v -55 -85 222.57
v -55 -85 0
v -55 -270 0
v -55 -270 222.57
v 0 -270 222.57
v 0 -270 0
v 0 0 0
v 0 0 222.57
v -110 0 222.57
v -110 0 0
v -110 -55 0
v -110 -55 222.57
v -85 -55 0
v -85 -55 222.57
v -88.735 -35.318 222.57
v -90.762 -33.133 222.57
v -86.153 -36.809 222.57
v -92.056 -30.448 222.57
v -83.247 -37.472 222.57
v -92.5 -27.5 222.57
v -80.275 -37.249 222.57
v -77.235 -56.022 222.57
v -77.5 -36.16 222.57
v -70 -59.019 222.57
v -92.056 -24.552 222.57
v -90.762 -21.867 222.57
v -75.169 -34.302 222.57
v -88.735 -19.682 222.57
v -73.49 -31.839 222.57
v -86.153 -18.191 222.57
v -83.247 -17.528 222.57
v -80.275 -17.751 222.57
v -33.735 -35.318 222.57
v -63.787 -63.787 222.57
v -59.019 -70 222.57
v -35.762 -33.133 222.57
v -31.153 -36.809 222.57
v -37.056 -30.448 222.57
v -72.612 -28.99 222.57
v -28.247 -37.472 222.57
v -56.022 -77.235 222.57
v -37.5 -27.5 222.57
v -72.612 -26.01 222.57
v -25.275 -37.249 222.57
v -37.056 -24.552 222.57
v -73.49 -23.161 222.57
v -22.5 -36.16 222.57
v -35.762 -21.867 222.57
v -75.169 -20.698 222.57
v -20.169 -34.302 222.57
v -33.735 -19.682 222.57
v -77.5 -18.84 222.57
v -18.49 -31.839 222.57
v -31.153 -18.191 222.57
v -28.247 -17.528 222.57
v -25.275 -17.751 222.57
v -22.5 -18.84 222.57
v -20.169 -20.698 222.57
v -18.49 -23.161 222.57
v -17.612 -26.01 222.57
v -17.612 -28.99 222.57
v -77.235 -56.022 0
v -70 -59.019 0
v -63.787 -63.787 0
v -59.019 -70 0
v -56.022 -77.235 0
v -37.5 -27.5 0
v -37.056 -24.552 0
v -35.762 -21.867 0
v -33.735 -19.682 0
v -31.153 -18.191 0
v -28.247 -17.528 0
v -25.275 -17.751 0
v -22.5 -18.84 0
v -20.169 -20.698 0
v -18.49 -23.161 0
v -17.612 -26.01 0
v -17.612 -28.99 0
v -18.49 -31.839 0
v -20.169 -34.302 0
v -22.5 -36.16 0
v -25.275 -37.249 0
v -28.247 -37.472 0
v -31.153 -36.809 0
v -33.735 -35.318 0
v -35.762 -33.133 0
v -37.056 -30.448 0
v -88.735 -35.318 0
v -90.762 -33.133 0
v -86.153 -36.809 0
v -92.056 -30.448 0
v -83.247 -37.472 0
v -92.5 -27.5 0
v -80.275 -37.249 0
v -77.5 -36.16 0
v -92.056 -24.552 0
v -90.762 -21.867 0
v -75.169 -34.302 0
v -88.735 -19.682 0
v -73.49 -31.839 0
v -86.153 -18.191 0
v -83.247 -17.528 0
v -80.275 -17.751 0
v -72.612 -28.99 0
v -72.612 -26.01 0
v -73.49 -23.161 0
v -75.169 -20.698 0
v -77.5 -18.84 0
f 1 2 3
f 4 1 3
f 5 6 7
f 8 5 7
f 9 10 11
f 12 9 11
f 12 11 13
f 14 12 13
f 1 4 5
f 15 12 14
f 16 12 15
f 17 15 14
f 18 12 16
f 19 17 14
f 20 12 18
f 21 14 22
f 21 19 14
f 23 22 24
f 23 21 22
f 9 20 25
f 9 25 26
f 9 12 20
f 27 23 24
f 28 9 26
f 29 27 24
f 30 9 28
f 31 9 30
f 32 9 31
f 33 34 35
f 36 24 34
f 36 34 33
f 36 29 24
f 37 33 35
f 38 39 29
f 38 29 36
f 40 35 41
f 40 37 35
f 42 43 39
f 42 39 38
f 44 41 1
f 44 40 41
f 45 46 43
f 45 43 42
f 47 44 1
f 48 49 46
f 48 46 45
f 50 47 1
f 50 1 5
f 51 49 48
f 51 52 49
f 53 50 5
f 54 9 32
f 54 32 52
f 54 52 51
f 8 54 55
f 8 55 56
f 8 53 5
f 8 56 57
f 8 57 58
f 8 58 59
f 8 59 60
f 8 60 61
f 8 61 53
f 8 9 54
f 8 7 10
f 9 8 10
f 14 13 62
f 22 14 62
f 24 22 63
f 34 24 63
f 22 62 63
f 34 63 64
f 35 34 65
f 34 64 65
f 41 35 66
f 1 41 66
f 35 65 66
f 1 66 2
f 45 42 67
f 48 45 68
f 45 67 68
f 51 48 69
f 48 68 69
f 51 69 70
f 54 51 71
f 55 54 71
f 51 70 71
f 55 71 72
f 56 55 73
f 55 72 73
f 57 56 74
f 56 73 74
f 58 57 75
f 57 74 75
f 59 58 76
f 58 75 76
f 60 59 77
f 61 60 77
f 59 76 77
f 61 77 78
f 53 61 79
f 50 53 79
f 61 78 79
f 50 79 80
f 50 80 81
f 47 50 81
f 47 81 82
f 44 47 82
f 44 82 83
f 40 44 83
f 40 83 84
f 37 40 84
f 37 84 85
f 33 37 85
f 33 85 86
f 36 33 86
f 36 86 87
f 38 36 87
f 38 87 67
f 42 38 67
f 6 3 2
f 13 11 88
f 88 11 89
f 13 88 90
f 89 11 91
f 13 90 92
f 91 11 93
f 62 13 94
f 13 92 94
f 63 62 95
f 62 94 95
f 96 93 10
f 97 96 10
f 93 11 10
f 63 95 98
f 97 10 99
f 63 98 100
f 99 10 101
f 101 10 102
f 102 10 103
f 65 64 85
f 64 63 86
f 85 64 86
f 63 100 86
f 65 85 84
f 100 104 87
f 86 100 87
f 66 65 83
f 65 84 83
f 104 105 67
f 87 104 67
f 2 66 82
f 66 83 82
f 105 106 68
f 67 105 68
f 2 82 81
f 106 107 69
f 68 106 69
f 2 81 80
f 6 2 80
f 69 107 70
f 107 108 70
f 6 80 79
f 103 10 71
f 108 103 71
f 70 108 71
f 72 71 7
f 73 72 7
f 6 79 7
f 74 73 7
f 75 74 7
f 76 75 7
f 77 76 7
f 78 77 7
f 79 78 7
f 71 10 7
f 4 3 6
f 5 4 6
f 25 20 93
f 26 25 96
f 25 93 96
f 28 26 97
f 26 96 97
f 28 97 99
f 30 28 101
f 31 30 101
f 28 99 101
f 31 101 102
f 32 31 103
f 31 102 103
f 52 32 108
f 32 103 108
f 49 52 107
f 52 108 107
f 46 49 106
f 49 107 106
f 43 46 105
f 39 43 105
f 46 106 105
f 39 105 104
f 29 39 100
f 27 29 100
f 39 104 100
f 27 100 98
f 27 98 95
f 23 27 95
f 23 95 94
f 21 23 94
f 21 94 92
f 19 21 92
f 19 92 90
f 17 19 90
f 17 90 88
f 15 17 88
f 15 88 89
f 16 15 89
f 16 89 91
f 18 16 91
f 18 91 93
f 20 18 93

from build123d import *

# Parameters (mm, degrees)
BOSS_EXTRUDE1_DEPTH    = 222.57
F_20_0MM_DOWEL_HOLE1_D = 20


with BuildPart() as part:
    # Sketch1 → Boss-Extrude1 (new body)
    with BuildSketch(Plane.XY):
        with BuildLine():
            Line((0, 0), (-110, 0))
            Line((-110, 0), (-110, -55))
            Line((-110, -55), (-85, -55))
            ThreePointArc((-85, -55), (-63.786796564, -63.786796564), (-55, -85))
            Line((-55, -85), (-55, -270))
            Line((-55, -270), (0, -270))
            Line((0, -270), (0, 0))
        make_face()
    extrude(amount=BOSS_EXTRUDE1_DEPTH)

    # Ø20.0mm Dowel Hole1 (through all)
    with Locations(Plane.XY.offset(222.57)):
        with Locations((-82.5, -27.5), (-27.5, -27.5)):
            Hole(F_20_0MM_DOWEL_HOLE1_D / 2)


solid = part.part
